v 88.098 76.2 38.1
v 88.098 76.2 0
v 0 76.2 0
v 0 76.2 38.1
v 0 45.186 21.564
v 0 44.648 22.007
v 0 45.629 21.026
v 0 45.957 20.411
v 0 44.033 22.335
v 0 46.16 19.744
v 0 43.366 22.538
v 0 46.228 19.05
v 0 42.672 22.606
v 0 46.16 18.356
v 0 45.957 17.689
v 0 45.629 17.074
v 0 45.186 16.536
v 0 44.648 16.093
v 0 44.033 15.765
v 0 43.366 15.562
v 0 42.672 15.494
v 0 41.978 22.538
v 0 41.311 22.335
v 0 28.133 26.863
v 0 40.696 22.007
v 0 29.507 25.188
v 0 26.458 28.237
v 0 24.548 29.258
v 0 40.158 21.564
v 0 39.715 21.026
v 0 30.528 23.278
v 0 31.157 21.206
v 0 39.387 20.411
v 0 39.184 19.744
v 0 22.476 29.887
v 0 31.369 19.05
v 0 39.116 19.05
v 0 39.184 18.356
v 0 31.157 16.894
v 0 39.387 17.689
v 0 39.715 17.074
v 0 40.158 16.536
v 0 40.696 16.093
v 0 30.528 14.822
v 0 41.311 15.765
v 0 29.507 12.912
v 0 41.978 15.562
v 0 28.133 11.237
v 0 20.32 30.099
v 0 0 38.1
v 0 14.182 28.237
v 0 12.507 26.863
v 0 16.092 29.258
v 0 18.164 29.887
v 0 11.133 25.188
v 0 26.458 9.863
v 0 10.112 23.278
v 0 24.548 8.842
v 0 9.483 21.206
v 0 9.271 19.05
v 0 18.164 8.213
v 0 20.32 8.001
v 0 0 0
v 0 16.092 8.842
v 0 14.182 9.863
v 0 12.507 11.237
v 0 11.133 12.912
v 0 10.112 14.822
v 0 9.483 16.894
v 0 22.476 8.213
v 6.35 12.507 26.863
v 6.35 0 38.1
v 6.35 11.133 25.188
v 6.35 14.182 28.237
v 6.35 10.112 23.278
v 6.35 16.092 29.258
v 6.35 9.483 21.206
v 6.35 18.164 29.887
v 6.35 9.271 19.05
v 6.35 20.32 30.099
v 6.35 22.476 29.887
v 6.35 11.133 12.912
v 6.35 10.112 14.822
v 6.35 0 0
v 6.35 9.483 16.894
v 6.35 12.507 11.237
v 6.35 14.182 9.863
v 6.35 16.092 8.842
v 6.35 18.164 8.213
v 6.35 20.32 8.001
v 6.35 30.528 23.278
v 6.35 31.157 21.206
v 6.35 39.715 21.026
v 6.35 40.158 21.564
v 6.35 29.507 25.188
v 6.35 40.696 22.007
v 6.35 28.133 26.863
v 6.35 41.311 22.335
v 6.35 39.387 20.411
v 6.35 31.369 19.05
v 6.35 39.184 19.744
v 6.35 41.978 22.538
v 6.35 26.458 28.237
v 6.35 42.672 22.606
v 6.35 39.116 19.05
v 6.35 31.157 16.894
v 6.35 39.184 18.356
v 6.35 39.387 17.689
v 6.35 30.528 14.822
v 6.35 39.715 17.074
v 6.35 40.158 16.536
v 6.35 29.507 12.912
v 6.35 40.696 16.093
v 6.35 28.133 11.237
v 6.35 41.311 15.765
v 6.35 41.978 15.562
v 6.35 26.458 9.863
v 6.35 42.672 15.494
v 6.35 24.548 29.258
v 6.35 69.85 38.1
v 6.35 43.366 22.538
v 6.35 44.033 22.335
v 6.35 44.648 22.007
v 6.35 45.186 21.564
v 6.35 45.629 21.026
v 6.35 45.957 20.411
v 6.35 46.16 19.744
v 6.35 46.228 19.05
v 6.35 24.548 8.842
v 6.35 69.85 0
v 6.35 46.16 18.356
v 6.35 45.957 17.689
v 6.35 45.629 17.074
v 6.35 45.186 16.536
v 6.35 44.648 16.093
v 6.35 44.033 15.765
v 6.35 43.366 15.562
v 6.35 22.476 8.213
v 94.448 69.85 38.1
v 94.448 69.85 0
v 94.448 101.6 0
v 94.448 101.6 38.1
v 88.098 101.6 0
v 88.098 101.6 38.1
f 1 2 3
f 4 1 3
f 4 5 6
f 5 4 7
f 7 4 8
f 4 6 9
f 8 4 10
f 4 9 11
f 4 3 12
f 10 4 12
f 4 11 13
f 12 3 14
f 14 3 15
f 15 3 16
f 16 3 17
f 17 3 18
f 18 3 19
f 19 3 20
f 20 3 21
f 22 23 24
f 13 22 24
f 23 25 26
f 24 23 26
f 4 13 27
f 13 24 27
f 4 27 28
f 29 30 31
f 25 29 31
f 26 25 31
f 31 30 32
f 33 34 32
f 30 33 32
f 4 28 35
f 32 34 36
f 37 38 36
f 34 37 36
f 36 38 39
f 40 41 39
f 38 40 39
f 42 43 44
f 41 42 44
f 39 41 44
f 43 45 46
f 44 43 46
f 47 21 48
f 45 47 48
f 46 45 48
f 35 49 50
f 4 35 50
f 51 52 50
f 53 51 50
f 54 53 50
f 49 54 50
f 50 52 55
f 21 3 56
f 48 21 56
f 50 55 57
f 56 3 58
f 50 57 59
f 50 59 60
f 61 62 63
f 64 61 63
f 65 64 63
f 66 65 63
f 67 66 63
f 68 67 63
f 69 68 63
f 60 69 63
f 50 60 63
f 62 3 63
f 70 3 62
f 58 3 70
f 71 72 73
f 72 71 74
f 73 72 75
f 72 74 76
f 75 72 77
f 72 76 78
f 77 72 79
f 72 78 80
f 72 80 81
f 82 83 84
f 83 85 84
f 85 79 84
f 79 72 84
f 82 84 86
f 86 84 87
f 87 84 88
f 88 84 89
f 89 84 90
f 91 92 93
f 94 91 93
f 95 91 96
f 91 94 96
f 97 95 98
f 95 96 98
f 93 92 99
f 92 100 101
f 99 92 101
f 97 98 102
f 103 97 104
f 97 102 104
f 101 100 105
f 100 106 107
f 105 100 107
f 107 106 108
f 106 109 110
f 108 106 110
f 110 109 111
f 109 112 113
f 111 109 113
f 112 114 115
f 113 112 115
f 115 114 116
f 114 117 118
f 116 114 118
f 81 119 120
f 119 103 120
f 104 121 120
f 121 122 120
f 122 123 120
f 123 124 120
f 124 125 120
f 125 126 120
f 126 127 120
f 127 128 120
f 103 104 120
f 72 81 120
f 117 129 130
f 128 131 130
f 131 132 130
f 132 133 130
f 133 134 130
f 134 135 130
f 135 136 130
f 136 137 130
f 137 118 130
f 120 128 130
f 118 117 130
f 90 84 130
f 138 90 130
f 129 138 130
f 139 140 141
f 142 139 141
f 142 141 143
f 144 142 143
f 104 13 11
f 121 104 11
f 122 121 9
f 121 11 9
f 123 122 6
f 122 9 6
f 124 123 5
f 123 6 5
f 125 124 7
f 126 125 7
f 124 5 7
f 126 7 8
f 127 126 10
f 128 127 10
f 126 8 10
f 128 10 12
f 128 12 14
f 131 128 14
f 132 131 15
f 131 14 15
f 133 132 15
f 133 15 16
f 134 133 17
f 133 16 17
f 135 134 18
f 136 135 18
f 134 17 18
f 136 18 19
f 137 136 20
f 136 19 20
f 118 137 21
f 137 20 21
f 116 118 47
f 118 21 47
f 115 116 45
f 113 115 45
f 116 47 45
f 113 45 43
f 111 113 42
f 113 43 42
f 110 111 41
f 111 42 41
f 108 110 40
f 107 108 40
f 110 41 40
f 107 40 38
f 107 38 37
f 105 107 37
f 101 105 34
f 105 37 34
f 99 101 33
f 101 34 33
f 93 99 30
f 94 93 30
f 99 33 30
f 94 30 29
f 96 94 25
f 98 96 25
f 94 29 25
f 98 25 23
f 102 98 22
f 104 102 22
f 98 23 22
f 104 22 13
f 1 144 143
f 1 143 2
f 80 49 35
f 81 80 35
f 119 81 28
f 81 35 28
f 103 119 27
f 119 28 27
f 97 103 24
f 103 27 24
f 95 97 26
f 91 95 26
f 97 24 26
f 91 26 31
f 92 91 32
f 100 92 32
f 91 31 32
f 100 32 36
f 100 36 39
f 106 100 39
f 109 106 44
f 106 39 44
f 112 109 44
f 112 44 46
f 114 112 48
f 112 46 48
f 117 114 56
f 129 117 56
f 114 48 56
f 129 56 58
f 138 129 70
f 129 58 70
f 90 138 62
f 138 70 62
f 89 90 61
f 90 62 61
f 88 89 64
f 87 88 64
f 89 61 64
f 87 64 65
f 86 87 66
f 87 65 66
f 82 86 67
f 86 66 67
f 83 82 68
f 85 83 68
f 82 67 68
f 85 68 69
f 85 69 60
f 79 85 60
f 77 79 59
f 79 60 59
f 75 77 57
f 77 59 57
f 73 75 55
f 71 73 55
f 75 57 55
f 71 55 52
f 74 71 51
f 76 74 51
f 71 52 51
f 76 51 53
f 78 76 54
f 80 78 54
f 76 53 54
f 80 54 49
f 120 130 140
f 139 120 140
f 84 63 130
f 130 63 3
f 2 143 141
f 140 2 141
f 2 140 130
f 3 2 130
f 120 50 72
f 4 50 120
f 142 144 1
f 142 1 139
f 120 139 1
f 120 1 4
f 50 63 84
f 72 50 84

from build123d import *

# Parameters (mm, degrees)
BOSS_EXTRUDE1_DEPTH = 38.1
SKETCH2_R           = 11.049
CUT_EXTRUDE1_DEPTH  = 6.35
SKETCH2_4_R         = 3.556
CUT_EXTRUDE2_DEPTH  = 6.35


with BuildPart() as part:
    # Sketch1 → Boss-Extrude1 (new body)
    with BuildSketch(Plane.XY):
        Polygon((0, 76.2), (0, 0), (6.35, 0), (6.35, 69.85), (94.447991824, 69.85), (94.447991824, 101.6), (88.097991824, 101.6), (88.097991824, 76.2), align=None)
    extrude(amount=BOSS_EXTRUDE1_DEPTH)

    # Sketch2 → Cut-Extrude1 (cut)
    with BuildSketch(Plane.ZY):
        with Locations((19.05, 20.32)):
            Circle(SKETCH2_R)
    extrude(amount=-CUT_EXTRUDE1_DEPTH, mode=Mode.SUBTRACT)

    # Sketch2<4> → Cut-Extrude2 (cut)
    with BuildSketch(Plane.ZY):
        with Locations((19.05, 42.672)):
            Circle(SKETCH2_4_R)
    extrude(amount=-CUT_EXTRUDE2_DEPTH, mode=Mode.SUBTRACT)


solid = part.part
